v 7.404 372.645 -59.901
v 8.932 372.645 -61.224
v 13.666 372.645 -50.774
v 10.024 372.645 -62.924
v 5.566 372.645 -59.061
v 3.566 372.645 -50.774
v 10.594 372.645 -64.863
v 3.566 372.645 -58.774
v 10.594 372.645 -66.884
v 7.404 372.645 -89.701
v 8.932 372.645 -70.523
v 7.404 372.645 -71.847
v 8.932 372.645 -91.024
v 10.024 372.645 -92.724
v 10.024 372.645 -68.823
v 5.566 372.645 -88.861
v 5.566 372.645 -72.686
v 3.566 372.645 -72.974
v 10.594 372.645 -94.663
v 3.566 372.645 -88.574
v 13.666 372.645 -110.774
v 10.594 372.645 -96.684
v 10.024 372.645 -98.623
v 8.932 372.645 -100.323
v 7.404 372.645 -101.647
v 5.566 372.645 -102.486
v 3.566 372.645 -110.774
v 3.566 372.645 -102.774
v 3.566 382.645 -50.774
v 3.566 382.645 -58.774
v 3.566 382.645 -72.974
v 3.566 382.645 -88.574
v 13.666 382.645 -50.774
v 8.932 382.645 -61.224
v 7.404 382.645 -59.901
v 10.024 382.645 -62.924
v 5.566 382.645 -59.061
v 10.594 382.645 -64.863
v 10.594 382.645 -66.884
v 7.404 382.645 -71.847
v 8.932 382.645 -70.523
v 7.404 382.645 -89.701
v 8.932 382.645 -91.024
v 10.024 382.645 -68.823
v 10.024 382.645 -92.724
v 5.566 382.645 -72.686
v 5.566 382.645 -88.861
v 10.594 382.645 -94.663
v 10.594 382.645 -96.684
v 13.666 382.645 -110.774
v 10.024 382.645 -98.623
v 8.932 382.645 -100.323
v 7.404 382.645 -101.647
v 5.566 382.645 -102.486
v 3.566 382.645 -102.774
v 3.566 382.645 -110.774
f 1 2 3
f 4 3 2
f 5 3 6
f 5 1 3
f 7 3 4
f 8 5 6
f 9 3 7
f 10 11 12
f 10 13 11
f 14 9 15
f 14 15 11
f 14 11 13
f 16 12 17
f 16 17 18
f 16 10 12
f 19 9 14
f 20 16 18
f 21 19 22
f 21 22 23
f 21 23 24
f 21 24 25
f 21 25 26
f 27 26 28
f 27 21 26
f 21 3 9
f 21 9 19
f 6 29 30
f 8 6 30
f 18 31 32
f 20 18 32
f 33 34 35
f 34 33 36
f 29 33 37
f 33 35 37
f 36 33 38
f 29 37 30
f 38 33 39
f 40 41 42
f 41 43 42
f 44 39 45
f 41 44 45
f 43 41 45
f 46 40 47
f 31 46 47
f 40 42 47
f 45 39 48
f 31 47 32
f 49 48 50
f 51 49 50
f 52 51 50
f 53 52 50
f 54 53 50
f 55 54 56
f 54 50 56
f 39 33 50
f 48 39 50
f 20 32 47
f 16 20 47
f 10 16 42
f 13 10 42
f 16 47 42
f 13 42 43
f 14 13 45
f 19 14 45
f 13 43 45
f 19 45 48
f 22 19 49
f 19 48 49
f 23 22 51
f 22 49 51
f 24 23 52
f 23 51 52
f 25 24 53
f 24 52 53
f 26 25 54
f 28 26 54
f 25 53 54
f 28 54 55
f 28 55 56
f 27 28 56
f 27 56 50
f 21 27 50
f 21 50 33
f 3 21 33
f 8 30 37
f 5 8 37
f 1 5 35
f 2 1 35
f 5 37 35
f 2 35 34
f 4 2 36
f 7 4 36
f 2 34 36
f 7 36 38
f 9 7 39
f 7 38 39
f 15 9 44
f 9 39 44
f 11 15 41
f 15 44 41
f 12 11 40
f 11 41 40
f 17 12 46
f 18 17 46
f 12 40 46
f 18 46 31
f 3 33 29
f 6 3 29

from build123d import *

# Parameters (mm, degrees)
EXTRUDE_1_DEPTH = 10


with BuildPart() as part:
    # Эскиз2 → Бобышка-Вытянуть1 (new body)
    with BuildSketch(Plane(origin=(0, 382.645061039, 0), x_dir=(1, 0, 0), z_dir=(0, 1, 0))):
        with BuildLine():
            Line((3.565848943, 102.773881836), (3.565848943, 110.773881836))
            Line((3.565848943, 110.773881836), (13.665848943, 110.773881836))
            Line((13.665848943, 110.773881836), (13.665848943, 50.773881836))
            Line((13.665848943, 50.773881836), (3.565848943, 50.773881836))
            Line((3.565848943, 50.773881836), (3.565848943, 58.773881836))
            ThreePointArc((3.565848943, 58.773881836), (10.665848943, 65.873881836), (3.565848943, 72.973881836))
            Line((3.565848943, 72.973881836), (3.565848943, 88.573881836))
            ThreePointArc((3.565848943, 88.573881836), (10.665848943, 95.673881836), (3.565848943, 102.773881836))
        make_face()
    extrude(amount=-EXTRUDE_1_DEPTH)


solid = part.part
